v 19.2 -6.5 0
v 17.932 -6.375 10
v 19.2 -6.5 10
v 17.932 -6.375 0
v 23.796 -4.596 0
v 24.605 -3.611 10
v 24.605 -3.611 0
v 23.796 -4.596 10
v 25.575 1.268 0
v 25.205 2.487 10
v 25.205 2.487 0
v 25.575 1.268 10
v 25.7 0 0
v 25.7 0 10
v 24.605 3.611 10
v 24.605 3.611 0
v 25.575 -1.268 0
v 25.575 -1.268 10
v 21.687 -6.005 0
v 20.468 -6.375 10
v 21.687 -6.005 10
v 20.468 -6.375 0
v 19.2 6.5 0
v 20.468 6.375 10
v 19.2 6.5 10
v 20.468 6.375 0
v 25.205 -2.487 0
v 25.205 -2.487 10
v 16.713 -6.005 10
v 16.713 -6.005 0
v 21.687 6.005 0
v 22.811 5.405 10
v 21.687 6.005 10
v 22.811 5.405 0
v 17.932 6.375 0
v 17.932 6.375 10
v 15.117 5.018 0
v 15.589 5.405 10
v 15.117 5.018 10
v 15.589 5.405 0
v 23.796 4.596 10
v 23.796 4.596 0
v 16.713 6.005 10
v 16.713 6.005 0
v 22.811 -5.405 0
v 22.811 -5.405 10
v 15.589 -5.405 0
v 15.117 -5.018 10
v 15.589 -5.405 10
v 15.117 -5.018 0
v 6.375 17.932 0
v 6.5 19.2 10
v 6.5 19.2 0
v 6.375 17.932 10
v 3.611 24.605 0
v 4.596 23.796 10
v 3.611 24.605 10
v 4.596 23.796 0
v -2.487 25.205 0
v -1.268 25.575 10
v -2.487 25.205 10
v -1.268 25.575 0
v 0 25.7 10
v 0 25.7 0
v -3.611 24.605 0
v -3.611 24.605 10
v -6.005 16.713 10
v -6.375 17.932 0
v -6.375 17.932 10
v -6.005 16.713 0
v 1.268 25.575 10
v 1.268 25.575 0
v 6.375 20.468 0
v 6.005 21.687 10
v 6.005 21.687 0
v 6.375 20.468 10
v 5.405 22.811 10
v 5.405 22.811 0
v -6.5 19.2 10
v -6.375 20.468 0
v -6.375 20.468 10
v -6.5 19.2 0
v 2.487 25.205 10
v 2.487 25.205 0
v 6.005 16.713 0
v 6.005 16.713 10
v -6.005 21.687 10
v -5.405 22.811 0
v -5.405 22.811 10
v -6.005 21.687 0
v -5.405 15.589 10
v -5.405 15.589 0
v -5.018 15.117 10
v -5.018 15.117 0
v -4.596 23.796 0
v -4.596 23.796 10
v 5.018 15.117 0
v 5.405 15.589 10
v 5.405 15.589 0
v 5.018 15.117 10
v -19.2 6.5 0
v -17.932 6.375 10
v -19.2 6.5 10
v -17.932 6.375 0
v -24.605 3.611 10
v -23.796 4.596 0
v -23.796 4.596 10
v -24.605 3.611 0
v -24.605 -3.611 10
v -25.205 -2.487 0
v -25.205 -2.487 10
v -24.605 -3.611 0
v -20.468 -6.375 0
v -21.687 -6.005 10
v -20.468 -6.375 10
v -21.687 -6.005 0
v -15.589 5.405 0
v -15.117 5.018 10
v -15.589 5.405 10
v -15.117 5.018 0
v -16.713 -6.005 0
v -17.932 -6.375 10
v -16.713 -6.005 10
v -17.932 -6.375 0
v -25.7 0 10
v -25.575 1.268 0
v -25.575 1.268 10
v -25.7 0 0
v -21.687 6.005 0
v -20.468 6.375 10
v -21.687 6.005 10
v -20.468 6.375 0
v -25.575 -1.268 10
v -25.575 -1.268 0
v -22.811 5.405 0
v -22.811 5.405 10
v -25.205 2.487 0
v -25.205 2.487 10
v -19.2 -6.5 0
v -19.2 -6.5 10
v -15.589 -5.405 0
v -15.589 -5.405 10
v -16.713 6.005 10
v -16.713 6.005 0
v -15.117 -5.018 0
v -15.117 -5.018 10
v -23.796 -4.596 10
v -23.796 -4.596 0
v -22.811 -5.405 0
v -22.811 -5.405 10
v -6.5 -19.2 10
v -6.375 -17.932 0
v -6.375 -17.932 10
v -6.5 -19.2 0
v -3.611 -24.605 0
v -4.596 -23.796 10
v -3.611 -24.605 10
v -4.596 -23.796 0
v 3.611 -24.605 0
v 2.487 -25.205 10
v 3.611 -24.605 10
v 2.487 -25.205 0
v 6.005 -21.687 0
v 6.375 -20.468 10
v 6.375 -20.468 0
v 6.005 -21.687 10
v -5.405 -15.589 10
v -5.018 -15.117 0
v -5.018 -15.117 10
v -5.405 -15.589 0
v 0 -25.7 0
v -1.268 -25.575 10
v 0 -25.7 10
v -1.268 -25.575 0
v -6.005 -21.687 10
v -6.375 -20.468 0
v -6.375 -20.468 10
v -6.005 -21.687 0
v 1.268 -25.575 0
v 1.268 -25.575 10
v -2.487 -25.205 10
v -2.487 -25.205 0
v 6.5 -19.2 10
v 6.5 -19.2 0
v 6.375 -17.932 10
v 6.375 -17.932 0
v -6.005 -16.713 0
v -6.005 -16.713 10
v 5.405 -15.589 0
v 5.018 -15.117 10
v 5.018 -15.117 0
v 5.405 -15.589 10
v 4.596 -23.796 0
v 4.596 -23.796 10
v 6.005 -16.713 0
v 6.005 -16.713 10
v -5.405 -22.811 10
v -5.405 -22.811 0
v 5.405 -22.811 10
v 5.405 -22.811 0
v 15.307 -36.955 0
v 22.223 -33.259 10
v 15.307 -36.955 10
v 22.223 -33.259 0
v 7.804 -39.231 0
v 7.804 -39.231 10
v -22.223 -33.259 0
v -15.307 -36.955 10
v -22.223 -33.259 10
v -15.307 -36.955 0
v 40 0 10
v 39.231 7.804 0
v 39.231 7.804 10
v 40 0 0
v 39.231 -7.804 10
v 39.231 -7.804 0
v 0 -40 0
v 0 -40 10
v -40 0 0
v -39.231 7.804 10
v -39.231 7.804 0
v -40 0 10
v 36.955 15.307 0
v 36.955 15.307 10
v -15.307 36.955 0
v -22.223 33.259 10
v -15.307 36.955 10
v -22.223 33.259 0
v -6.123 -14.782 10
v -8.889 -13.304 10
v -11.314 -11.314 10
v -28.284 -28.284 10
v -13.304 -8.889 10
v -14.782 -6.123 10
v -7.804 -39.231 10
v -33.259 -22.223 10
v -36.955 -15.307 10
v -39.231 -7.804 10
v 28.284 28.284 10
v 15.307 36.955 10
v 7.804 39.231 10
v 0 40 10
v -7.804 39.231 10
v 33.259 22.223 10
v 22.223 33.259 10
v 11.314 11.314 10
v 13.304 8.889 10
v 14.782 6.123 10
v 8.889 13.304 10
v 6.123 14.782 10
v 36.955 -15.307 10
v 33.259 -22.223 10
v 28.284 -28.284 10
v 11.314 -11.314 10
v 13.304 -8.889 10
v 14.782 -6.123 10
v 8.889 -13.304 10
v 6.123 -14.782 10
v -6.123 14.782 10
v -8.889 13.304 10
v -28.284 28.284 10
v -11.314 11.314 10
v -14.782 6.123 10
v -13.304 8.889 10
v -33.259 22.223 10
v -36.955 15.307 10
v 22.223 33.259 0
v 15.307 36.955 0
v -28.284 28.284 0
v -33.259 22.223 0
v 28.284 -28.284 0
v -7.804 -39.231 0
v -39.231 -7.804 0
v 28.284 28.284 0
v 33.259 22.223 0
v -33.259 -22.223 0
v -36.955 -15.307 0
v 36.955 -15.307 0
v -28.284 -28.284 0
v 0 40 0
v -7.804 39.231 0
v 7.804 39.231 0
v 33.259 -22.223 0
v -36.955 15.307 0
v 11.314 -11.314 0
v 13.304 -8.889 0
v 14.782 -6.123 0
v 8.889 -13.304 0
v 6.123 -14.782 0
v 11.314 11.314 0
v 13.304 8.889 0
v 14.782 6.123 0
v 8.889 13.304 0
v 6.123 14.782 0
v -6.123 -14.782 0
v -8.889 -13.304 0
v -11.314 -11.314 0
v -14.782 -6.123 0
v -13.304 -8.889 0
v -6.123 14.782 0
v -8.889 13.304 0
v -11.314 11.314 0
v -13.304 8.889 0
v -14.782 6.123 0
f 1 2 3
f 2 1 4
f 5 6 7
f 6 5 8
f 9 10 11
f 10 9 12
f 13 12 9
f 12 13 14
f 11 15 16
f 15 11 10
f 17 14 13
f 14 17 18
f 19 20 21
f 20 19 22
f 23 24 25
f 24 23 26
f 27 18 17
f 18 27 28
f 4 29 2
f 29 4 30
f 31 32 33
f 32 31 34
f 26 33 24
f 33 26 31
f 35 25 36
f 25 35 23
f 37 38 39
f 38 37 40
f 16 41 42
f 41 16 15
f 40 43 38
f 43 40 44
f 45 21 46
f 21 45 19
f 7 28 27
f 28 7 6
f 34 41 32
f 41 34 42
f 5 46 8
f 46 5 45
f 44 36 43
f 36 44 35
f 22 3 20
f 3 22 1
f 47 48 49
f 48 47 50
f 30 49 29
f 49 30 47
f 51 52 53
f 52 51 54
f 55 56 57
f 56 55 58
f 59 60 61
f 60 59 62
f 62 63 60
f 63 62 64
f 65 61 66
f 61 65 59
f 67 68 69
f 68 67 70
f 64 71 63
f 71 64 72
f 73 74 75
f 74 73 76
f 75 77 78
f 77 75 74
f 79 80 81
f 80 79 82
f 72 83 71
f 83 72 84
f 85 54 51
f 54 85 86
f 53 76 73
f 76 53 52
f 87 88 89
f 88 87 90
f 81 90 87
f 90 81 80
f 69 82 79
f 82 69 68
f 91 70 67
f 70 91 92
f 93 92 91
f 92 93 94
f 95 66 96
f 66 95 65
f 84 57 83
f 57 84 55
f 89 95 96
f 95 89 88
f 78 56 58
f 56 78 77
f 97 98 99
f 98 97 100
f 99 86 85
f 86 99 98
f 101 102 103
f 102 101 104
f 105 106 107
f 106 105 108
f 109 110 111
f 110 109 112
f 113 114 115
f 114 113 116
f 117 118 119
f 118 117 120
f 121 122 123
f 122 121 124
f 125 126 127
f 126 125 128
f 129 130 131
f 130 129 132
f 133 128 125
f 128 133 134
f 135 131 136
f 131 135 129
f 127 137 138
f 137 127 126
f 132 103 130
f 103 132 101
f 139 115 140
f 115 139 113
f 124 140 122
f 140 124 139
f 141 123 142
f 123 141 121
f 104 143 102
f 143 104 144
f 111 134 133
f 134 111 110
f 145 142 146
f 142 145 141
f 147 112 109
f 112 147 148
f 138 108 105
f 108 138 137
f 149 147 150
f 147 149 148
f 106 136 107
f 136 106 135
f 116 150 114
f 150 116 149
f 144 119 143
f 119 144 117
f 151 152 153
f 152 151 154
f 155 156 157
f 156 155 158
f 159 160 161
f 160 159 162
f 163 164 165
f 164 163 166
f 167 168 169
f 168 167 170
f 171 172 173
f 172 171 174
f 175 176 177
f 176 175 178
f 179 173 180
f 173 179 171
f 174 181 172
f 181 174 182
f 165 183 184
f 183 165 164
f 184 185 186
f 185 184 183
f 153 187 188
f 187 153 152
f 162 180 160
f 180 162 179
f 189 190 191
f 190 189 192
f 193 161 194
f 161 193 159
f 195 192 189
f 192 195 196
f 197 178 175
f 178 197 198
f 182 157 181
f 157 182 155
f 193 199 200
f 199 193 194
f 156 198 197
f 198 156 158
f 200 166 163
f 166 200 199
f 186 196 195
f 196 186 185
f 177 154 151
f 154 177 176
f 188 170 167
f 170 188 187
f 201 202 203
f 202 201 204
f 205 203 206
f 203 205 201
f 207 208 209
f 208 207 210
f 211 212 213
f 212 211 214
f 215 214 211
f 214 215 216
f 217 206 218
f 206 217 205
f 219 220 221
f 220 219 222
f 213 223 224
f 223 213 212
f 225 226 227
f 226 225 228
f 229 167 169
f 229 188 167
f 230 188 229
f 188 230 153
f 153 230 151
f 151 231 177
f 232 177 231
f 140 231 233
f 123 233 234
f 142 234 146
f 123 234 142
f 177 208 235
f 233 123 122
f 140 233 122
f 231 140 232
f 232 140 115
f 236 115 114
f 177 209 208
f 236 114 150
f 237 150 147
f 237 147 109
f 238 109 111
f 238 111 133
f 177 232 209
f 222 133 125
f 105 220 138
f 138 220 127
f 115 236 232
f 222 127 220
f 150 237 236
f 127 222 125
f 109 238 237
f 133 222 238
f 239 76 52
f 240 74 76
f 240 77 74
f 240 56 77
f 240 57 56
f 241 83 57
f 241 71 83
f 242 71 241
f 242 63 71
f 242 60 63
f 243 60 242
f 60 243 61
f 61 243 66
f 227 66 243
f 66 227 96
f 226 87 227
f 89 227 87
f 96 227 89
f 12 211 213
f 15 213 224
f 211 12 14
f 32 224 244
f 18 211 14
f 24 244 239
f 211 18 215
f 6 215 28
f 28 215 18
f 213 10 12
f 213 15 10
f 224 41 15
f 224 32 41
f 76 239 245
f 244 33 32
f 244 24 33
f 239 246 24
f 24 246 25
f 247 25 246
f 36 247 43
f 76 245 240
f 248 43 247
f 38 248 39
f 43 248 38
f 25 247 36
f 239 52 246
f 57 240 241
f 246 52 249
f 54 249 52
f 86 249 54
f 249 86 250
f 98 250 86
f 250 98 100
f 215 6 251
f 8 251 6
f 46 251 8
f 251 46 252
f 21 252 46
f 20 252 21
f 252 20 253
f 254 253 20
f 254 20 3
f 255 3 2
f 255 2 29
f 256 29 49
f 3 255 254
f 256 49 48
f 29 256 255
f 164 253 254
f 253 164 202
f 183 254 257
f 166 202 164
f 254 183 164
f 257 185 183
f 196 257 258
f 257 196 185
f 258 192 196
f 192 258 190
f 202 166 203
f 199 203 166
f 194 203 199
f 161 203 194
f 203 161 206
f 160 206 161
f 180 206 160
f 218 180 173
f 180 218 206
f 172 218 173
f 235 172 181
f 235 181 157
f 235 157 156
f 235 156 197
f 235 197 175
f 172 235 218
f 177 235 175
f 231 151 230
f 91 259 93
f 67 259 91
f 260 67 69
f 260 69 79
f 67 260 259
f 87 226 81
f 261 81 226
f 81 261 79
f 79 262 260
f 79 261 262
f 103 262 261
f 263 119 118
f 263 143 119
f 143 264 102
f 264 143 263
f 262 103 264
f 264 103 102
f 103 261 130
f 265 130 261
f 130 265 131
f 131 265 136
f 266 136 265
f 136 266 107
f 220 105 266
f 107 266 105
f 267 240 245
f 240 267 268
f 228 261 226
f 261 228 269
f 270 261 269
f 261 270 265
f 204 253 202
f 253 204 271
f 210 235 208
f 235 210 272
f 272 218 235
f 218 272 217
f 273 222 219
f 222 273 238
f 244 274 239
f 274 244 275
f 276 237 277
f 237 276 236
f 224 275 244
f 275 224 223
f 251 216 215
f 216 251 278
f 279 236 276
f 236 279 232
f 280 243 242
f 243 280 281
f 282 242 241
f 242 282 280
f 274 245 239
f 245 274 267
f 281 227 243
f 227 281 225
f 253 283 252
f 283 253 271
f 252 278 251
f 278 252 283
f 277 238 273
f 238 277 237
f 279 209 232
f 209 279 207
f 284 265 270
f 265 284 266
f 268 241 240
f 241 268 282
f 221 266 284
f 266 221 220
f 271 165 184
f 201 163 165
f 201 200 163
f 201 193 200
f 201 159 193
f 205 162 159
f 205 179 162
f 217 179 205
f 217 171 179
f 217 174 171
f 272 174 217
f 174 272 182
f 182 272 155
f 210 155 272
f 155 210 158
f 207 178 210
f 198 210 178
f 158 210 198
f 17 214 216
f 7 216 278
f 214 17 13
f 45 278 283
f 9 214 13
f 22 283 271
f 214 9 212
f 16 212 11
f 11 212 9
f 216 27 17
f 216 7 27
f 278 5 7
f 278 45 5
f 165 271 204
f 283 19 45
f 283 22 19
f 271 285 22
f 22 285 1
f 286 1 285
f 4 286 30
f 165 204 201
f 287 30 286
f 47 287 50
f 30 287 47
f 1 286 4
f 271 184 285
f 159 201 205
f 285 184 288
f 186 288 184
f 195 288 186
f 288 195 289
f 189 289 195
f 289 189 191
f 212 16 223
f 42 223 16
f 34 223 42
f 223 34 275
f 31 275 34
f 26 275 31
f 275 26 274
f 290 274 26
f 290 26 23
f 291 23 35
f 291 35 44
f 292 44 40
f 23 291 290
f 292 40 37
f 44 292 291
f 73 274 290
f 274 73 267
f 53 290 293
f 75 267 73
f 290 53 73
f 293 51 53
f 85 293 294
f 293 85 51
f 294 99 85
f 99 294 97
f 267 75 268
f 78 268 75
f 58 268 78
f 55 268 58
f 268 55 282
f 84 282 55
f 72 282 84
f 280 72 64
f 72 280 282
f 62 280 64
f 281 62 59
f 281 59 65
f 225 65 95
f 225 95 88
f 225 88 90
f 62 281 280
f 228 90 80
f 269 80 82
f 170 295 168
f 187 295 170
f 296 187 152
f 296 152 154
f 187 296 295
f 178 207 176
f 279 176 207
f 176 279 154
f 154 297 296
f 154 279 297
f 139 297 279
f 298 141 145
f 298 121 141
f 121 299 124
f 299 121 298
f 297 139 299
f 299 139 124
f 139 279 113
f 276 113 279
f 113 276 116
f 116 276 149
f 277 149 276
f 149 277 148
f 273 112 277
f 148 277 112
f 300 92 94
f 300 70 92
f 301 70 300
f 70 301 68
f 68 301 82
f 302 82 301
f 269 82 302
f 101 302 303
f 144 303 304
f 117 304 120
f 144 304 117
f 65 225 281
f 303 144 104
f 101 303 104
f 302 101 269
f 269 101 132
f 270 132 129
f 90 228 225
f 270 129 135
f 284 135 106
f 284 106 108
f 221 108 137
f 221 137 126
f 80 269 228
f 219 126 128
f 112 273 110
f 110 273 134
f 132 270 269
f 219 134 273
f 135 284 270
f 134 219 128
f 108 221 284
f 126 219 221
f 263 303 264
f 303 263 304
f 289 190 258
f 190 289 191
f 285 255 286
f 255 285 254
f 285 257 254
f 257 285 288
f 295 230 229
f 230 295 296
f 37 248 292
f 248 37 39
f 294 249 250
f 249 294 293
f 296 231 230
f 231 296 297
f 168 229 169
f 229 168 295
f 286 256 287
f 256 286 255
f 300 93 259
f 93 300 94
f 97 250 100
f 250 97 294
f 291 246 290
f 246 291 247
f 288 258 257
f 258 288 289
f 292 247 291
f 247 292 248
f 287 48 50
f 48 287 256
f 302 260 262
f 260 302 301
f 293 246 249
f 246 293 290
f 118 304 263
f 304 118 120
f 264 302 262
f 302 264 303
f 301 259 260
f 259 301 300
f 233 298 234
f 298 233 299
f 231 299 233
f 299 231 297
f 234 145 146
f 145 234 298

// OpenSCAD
$fn = 32;

// ----------------------------------------------------------------------
// Bolt-circle flange: 80 mm outside, 4 bolt holes, bore 32 mm
// ----------------------------------------------------------------------

// --- parameters (mm) ---
flange_d = 80;            // flange outside diameter
flange_t = 10;            // flange thickness
bolts = 4;                // number of bolt holes
bolt_d = 13;              // bolt clearance
bolt_r = 19.2;            // bolt circle radius
bore_d = 32;              // centre bore

module body() {
  cylinder(h = flange_t, d = flange_d);
}

difference() {
  body();
  /* bolt circle */
  for (i = [0 : bolts - 1]) rotate([0, 0, i * 360 / bolts]) translate([bolt_r, 0, -1]) cylinder(h = flange_t + 3, d = bolt_d);
  translate([0, 0, -1]) cylinder(h = flange_t + 3, d = bore_d);
}
